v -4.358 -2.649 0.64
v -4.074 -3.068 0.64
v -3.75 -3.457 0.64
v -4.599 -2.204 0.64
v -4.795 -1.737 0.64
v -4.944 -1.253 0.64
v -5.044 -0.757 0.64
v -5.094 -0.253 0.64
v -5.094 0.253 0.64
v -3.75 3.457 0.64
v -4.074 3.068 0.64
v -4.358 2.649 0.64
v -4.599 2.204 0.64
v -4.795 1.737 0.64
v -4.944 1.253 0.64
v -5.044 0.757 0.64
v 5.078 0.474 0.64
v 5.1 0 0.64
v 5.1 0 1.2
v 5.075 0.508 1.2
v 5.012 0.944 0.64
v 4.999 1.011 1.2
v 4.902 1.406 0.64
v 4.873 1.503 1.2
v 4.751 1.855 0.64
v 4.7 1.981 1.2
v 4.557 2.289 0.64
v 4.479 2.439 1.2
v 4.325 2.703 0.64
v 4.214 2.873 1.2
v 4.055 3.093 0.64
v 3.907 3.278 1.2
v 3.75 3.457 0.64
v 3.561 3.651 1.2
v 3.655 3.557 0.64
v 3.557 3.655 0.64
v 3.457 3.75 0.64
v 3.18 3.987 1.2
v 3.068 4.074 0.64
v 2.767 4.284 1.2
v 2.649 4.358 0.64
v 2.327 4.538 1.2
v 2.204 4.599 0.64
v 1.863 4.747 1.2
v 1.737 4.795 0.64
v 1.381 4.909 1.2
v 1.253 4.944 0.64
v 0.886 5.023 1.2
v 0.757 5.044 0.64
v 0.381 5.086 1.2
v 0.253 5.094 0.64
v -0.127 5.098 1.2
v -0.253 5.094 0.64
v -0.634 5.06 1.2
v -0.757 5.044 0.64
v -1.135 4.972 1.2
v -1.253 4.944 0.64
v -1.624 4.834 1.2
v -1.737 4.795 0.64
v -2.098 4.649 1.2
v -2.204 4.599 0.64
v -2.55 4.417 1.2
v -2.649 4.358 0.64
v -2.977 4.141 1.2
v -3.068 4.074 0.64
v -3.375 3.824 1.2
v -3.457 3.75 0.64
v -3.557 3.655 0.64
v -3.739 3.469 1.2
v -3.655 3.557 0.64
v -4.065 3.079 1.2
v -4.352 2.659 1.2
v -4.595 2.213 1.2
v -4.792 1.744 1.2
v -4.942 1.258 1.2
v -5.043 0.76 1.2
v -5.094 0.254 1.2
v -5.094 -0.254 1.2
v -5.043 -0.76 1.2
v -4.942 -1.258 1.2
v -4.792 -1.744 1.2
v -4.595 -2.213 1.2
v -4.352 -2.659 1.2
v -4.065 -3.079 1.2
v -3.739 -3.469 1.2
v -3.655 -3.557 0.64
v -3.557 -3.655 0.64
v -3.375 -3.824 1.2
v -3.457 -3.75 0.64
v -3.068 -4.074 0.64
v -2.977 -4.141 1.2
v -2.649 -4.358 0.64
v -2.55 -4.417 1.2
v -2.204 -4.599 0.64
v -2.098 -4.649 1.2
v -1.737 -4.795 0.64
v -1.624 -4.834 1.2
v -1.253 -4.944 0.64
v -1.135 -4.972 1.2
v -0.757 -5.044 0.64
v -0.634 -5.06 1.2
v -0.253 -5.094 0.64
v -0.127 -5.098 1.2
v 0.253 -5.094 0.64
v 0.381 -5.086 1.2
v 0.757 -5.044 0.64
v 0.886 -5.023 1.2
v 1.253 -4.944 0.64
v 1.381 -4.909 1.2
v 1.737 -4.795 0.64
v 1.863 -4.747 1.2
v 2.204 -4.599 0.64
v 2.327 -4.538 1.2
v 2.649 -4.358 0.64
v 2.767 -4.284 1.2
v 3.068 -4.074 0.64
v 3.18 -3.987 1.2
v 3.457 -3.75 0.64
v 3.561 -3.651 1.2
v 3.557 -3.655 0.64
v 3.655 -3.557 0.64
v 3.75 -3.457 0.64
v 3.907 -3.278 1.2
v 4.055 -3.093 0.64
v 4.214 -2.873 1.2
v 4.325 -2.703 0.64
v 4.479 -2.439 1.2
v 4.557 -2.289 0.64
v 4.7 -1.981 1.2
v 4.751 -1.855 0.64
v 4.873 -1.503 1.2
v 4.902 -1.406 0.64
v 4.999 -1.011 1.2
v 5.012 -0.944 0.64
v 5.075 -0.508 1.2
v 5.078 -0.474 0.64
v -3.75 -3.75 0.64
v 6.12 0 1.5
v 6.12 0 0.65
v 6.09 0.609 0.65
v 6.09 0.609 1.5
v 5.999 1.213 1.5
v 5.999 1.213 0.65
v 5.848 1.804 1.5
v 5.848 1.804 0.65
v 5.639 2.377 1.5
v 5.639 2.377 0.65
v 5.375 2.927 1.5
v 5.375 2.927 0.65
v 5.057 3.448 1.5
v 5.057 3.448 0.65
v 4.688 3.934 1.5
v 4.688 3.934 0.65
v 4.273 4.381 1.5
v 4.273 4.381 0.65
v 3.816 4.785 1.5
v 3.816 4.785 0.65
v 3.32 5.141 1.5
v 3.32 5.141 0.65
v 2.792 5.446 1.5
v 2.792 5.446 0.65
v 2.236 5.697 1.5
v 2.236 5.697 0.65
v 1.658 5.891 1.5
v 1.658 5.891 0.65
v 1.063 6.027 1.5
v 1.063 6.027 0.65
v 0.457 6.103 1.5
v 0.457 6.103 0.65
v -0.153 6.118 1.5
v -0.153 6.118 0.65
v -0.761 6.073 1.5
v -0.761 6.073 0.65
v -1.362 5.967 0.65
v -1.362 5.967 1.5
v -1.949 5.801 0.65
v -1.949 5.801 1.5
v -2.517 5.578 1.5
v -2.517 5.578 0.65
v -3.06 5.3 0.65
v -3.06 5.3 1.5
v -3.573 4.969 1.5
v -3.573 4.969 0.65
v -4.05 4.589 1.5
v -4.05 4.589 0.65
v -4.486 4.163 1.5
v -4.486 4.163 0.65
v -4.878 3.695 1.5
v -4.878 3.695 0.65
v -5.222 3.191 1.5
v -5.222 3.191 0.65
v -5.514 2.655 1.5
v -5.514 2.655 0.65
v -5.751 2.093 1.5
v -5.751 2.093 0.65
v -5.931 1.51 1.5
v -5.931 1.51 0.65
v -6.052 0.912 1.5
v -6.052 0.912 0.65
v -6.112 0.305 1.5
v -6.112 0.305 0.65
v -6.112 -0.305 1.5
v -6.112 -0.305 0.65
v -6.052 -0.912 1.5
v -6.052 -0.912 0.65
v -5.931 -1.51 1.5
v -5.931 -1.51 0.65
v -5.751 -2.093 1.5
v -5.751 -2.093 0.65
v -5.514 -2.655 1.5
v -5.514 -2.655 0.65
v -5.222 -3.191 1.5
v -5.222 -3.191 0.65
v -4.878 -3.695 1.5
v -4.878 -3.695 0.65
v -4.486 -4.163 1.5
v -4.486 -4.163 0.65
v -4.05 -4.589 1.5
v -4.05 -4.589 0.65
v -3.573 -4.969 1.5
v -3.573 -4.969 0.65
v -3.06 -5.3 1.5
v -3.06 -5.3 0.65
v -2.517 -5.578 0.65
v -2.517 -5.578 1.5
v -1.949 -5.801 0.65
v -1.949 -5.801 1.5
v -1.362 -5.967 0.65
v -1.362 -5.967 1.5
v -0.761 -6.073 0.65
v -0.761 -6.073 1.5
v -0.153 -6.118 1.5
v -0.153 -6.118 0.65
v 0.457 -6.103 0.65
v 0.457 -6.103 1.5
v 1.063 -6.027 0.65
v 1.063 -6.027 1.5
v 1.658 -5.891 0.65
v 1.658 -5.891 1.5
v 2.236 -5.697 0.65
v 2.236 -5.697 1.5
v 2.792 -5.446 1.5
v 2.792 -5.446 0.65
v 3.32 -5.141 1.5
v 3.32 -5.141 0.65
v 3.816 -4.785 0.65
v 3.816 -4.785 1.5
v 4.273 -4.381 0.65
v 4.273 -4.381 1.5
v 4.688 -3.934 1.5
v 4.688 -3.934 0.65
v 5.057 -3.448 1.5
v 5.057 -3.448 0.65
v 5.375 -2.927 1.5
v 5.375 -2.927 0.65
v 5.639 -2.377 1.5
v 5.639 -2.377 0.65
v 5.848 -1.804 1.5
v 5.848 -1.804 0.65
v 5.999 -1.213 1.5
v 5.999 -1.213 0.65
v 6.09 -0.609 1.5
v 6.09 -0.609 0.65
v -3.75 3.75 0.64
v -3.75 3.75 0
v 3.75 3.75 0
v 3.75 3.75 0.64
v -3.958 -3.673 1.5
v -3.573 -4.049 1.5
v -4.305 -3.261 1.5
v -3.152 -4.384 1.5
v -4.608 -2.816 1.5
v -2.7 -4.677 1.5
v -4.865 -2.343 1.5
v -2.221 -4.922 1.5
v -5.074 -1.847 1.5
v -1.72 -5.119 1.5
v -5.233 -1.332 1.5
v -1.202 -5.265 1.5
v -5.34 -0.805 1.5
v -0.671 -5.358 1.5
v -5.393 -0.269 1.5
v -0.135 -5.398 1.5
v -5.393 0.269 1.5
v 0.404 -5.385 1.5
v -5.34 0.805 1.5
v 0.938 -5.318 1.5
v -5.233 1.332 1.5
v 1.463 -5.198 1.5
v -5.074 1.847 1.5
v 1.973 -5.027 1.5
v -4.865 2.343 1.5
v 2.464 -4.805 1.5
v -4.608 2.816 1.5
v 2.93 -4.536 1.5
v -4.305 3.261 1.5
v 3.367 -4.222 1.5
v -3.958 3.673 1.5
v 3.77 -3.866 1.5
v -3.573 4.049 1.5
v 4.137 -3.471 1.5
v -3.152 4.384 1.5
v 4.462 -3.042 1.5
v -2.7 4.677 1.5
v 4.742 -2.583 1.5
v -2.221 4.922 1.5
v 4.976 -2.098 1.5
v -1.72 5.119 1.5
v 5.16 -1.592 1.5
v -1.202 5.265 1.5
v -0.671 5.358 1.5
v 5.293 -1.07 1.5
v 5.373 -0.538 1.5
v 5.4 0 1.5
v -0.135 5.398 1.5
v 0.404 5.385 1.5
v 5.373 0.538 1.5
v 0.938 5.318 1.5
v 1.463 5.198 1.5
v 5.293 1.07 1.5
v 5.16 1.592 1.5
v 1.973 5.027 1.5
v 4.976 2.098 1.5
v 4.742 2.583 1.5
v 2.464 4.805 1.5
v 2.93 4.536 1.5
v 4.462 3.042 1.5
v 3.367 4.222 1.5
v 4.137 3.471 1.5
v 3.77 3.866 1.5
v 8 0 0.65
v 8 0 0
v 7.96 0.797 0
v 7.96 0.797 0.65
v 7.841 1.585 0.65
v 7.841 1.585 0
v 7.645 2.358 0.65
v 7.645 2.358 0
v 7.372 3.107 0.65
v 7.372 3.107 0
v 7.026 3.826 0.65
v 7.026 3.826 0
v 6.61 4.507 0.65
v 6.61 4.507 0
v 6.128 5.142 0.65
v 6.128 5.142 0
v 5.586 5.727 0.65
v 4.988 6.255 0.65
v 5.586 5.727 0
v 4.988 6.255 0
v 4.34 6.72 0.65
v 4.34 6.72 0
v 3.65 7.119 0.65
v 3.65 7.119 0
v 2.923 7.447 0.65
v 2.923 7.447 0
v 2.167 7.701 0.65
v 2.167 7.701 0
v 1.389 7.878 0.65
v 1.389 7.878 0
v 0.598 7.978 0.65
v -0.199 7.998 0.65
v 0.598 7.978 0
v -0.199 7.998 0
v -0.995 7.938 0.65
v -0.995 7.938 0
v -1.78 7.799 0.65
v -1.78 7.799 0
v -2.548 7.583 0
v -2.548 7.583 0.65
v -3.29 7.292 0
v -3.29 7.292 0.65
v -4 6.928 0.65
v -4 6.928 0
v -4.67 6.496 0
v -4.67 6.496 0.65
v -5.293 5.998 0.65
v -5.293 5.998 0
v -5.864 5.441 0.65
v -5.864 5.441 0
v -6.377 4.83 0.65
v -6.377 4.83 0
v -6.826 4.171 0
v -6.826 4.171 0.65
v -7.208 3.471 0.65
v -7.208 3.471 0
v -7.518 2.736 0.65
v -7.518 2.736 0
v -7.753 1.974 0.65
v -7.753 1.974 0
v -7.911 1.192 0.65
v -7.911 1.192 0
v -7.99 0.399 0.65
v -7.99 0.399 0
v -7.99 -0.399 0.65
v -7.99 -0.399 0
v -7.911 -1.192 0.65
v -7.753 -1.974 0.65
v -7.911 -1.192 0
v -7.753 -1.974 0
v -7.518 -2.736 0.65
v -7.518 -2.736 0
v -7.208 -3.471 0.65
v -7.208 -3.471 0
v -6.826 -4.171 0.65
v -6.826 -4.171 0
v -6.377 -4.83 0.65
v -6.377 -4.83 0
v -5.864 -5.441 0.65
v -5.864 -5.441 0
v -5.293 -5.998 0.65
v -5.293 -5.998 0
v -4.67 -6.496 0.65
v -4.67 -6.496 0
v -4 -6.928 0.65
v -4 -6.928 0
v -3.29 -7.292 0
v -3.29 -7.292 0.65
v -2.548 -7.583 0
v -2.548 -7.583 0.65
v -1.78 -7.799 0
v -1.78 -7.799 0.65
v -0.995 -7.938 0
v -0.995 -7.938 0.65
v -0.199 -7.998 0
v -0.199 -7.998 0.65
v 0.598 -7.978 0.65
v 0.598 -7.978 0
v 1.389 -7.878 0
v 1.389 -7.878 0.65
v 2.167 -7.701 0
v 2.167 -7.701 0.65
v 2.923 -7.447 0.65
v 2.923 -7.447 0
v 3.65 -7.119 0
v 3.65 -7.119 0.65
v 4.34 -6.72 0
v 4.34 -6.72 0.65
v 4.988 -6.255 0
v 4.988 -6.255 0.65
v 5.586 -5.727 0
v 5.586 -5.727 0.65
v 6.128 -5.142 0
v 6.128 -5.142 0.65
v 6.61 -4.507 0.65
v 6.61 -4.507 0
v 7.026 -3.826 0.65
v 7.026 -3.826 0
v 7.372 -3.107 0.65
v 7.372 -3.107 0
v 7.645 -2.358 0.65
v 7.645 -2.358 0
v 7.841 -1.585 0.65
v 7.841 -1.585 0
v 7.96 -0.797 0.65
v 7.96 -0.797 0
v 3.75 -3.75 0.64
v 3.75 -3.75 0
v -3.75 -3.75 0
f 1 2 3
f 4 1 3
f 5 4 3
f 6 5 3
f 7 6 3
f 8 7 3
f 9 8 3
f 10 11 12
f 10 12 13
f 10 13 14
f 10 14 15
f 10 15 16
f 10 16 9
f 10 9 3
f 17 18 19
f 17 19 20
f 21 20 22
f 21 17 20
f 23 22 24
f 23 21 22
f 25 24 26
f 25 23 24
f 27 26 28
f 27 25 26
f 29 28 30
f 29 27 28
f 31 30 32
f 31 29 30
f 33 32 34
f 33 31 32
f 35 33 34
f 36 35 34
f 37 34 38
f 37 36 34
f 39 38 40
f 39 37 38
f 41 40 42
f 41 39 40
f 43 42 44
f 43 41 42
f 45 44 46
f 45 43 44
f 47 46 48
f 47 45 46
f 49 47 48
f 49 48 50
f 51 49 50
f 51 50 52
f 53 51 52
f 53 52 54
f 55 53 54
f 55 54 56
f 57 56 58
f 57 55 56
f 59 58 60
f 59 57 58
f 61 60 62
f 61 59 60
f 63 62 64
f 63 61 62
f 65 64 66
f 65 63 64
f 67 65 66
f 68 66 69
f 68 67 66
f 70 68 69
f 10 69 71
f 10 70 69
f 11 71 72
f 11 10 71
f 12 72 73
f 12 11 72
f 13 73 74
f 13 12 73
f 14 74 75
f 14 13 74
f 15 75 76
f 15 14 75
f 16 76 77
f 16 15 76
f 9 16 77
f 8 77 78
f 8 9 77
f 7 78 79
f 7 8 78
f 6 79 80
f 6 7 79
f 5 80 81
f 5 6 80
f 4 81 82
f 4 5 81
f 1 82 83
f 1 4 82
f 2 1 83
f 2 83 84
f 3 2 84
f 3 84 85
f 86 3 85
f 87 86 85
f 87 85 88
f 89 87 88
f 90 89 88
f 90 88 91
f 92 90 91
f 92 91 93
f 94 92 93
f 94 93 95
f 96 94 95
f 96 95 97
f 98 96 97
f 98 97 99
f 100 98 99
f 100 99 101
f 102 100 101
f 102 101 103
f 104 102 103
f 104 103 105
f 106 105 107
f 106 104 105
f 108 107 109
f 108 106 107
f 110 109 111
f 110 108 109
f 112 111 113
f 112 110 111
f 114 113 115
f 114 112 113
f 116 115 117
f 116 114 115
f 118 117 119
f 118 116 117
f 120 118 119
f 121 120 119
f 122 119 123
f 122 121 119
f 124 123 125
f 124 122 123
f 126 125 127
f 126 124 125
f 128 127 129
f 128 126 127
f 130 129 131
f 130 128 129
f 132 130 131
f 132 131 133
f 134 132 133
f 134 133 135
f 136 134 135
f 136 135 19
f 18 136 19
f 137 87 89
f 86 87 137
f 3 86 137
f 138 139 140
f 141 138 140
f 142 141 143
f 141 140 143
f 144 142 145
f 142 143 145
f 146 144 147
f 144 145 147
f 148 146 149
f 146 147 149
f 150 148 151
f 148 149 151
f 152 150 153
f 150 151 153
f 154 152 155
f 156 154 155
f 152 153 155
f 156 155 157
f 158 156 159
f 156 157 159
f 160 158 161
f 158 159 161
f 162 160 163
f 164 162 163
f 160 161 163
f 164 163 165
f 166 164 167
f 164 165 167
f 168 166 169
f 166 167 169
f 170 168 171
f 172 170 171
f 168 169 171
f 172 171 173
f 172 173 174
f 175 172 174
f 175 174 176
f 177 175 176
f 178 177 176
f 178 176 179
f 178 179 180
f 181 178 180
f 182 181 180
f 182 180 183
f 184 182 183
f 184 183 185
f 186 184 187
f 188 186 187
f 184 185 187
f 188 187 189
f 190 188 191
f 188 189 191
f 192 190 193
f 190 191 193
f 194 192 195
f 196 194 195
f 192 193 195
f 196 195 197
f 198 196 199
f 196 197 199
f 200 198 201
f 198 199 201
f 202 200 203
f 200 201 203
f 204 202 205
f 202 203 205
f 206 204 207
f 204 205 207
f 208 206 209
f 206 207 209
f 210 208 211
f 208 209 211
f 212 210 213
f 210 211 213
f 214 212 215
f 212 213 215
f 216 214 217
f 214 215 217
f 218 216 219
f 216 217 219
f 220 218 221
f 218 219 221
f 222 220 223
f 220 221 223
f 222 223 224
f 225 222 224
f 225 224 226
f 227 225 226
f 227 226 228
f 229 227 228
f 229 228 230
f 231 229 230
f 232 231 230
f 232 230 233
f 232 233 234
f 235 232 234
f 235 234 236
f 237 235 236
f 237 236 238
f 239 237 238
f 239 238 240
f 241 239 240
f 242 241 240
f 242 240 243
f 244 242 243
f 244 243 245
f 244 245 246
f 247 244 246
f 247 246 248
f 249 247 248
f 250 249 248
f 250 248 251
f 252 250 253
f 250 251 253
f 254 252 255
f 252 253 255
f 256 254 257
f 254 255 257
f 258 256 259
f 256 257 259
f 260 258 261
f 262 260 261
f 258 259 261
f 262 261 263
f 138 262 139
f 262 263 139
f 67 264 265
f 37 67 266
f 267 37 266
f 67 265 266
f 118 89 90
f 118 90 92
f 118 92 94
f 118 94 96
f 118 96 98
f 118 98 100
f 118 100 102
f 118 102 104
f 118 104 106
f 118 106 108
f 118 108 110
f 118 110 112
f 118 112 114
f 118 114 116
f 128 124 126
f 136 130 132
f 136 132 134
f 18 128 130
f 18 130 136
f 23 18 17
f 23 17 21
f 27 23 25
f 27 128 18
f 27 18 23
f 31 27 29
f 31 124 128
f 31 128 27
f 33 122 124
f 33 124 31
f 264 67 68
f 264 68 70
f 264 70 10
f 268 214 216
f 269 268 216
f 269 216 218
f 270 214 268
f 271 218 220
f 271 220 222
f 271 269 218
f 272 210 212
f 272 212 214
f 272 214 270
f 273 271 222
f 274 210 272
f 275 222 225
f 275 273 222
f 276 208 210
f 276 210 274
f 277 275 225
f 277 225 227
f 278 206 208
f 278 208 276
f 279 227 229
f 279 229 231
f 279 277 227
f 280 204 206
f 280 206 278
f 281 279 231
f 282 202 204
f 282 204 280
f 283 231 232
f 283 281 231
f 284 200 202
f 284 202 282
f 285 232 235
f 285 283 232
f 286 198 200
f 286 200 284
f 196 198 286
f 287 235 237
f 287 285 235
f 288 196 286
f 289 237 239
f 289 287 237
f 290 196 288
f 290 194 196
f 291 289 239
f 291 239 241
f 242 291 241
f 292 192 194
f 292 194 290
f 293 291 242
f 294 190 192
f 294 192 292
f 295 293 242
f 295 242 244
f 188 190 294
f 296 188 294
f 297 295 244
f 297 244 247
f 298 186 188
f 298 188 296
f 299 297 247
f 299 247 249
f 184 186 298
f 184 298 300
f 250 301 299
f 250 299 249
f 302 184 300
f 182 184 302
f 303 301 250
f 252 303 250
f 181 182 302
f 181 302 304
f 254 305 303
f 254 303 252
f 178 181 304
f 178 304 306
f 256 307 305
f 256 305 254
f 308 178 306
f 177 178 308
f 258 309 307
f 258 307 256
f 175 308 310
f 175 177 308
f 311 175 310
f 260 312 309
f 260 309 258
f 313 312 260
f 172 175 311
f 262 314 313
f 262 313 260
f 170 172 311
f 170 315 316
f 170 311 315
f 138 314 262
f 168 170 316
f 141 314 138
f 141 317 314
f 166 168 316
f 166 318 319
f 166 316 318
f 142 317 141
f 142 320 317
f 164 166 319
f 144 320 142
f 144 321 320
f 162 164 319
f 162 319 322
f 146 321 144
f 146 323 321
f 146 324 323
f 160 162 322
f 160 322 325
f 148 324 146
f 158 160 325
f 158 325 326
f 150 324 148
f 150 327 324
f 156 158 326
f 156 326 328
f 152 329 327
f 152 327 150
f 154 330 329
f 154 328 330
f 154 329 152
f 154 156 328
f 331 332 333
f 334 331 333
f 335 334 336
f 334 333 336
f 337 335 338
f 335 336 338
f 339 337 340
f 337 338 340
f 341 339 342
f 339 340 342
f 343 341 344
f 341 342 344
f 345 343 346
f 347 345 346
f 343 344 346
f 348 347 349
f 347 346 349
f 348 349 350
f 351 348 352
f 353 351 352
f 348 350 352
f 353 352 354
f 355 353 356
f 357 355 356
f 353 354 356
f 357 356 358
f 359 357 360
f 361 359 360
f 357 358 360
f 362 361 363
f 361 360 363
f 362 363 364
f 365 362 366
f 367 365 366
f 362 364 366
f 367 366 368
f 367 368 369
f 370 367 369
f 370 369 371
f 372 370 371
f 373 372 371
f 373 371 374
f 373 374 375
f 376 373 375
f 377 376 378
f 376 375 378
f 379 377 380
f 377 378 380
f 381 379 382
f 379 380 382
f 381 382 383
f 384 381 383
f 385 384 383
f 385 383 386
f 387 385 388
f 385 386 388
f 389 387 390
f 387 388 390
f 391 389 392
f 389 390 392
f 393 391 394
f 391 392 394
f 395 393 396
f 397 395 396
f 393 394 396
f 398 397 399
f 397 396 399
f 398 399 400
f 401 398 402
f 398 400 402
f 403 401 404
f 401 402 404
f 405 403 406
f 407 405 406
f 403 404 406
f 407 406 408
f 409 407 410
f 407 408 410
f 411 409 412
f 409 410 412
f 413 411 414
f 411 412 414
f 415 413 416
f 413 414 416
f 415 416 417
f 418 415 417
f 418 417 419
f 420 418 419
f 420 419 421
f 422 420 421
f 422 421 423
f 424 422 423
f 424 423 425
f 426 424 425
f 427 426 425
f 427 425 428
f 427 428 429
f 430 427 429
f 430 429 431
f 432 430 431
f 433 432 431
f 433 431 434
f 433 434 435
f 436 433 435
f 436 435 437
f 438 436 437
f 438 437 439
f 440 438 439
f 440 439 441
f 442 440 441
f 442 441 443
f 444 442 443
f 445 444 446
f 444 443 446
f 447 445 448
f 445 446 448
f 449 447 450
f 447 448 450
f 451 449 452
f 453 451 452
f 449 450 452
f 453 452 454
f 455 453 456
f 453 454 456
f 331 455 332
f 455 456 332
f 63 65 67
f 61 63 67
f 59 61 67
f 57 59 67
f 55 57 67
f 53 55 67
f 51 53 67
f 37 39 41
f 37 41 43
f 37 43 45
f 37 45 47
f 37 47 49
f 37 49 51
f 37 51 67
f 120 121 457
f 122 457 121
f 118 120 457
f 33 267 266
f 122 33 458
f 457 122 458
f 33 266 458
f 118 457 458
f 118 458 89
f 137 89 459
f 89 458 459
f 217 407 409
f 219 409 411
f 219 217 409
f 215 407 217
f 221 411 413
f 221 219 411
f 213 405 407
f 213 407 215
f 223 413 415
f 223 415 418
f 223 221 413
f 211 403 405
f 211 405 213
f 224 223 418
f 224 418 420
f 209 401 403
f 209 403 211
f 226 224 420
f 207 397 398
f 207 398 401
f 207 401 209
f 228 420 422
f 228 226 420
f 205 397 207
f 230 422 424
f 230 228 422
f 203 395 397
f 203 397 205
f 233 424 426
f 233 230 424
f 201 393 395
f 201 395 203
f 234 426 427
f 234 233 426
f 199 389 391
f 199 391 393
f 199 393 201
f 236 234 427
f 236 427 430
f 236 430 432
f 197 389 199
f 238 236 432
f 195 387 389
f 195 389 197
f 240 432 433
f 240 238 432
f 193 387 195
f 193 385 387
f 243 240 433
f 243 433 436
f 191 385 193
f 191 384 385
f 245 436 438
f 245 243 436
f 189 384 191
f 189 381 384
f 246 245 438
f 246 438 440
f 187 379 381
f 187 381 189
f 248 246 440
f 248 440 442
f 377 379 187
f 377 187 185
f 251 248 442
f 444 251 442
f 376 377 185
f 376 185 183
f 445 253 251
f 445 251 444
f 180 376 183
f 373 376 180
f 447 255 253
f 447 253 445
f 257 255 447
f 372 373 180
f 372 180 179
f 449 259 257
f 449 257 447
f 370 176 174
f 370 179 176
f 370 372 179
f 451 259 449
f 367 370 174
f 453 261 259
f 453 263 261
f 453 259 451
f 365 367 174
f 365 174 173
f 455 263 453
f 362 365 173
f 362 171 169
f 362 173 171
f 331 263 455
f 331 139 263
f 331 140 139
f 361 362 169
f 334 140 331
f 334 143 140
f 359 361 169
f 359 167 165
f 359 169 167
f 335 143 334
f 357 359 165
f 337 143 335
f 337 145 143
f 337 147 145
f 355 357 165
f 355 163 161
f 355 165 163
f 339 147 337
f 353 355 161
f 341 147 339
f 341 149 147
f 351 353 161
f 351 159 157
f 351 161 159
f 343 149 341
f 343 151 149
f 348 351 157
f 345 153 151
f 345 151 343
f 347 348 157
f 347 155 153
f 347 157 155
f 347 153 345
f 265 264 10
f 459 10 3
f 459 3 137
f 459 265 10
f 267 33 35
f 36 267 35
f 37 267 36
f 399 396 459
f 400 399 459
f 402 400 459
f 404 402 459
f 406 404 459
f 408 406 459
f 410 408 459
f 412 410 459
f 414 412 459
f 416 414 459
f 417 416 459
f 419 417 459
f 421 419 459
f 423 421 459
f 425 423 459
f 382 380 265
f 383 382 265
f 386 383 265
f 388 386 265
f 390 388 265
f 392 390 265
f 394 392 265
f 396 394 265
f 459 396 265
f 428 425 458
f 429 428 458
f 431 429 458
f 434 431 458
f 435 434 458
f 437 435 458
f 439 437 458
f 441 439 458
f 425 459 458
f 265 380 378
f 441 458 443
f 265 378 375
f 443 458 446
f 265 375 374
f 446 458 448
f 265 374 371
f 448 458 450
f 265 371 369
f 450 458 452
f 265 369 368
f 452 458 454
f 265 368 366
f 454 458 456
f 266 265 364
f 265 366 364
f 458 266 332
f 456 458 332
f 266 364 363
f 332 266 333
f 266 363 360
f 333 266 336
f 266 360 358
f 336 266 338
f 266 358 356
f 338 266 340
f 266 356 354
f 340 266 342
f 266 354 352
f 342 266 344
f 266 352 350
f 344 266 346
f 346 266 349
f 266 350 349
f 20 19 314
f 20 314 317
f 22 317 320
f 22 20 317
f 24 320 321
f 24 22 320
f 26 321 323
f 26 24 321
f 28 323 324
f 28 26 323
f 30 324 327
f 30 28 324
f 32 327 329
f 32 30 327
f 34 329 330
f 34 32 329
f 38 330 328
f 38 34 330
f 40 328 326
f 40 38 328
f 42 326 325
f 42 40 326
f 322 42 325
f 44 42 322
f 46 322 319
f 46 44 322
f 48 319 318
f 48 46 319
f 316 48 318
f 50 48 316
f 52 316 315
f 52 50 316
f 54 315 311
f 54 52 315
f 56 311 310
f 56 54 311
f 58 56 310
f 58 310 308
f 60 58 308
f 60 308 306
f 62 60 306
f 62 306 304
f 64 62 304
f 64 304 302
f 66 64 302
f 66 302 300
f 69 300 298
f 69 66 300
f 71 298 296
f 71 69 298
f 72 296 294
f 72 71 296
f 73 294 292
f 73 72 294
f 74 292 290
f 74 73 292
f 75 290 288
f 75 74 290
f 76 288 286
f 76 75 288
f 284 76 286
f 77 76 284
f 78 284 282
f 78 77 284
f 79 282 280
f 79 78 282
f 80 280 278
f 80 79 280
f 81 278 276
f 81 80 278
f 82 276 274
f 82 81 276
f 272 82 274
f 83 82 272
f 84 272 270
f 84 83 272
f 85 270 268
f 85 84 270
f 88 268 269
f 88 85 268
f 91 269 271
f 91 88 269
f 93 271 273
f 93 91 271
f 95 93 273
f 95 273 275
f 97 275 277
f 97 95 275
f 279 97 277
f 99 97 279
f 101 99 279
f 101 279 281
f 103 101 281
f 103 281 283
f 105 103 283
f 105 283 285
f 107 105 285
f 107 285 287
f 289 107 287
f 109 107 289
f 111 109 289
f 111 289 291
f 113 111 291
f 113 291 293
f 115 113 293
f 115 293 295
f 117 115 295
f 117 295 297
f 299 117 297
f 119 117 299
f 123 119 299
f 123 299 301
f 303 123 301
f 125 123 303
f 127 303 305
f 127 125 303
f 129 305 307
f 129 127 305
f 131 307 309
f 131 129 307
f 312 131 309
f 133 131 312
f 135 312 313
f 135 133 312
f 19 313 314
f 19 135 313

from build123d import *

# Parameters (mm, degrees)
SKETCH_1_R          = 8
EXTRUDE_1_DEPTH     = 0.65
EXTRUDE_START       = 0.65
SKETCH_2_R          = 6.12
SKETCH_2_R_2        = 5.1
EXTRUDE_2_DEPTH     = 0.85
CUT_EXTRUDE_START   = 0.65
SKETCH_3_R          = 5.1
CUT_EXTRUDE_1_DEPTH = 0.01
CUT_EXTRUDE_2_DEPTH = 0.64
CHAMFER_1_SIZE      = 0.3


with BuildPart() as part:
    # 草图1 → 凸台-拉伸1 (new body)
    with BuildSketch(Plane.XY):
        Circle(SKETCH_1_R)
    extrude(amount=EXTRUDE_1_DEPTH)

    # 草图2 → 凸台-拉伸2 (add)
    with BuildSketch(Plane.XY.offset(EXTRUDE_START)):
        Circle(SKETCH_2_R)
        Circle(SKETCH_2_R_2, mode=Mode.SUBTRACT)
    extrude(amount=EXTRUDE_2_DEPTH)

    # 草图3 → 切除-拉伸1 (cut)
    with BuildSketch(Plane.XY.offset(CUT_EXTRUDE_START)):
        Circle(SKETCH_3_R)
    extrude(amount=-CUT_EXTRUDE_1_DEPTH, mode=Mode.SUBTRACT)

    # 草图4 → 切除-拉伸2 (cut)
    with BuildSketch(Plane.XY):
        Polygon((3.75, 3.75), (3.75, -3.75), (-3.75, -3.75), (-3.75, 0), (-3.75, 3.75), align=None)
    extrude(amount=CUT_EXTRUDE_2_DEPTH, mode=Mode.SUBTRACT)

    # 倒角1
    chamfer_1_edges = [part.edges().sort_by_distance(p)[0] for p in [
        (-5.1, 0, 1.5),
    ]]
    chamfer(chamfer_1_edges, length=CHAMFER_1_SIZE)


solid = part.part
